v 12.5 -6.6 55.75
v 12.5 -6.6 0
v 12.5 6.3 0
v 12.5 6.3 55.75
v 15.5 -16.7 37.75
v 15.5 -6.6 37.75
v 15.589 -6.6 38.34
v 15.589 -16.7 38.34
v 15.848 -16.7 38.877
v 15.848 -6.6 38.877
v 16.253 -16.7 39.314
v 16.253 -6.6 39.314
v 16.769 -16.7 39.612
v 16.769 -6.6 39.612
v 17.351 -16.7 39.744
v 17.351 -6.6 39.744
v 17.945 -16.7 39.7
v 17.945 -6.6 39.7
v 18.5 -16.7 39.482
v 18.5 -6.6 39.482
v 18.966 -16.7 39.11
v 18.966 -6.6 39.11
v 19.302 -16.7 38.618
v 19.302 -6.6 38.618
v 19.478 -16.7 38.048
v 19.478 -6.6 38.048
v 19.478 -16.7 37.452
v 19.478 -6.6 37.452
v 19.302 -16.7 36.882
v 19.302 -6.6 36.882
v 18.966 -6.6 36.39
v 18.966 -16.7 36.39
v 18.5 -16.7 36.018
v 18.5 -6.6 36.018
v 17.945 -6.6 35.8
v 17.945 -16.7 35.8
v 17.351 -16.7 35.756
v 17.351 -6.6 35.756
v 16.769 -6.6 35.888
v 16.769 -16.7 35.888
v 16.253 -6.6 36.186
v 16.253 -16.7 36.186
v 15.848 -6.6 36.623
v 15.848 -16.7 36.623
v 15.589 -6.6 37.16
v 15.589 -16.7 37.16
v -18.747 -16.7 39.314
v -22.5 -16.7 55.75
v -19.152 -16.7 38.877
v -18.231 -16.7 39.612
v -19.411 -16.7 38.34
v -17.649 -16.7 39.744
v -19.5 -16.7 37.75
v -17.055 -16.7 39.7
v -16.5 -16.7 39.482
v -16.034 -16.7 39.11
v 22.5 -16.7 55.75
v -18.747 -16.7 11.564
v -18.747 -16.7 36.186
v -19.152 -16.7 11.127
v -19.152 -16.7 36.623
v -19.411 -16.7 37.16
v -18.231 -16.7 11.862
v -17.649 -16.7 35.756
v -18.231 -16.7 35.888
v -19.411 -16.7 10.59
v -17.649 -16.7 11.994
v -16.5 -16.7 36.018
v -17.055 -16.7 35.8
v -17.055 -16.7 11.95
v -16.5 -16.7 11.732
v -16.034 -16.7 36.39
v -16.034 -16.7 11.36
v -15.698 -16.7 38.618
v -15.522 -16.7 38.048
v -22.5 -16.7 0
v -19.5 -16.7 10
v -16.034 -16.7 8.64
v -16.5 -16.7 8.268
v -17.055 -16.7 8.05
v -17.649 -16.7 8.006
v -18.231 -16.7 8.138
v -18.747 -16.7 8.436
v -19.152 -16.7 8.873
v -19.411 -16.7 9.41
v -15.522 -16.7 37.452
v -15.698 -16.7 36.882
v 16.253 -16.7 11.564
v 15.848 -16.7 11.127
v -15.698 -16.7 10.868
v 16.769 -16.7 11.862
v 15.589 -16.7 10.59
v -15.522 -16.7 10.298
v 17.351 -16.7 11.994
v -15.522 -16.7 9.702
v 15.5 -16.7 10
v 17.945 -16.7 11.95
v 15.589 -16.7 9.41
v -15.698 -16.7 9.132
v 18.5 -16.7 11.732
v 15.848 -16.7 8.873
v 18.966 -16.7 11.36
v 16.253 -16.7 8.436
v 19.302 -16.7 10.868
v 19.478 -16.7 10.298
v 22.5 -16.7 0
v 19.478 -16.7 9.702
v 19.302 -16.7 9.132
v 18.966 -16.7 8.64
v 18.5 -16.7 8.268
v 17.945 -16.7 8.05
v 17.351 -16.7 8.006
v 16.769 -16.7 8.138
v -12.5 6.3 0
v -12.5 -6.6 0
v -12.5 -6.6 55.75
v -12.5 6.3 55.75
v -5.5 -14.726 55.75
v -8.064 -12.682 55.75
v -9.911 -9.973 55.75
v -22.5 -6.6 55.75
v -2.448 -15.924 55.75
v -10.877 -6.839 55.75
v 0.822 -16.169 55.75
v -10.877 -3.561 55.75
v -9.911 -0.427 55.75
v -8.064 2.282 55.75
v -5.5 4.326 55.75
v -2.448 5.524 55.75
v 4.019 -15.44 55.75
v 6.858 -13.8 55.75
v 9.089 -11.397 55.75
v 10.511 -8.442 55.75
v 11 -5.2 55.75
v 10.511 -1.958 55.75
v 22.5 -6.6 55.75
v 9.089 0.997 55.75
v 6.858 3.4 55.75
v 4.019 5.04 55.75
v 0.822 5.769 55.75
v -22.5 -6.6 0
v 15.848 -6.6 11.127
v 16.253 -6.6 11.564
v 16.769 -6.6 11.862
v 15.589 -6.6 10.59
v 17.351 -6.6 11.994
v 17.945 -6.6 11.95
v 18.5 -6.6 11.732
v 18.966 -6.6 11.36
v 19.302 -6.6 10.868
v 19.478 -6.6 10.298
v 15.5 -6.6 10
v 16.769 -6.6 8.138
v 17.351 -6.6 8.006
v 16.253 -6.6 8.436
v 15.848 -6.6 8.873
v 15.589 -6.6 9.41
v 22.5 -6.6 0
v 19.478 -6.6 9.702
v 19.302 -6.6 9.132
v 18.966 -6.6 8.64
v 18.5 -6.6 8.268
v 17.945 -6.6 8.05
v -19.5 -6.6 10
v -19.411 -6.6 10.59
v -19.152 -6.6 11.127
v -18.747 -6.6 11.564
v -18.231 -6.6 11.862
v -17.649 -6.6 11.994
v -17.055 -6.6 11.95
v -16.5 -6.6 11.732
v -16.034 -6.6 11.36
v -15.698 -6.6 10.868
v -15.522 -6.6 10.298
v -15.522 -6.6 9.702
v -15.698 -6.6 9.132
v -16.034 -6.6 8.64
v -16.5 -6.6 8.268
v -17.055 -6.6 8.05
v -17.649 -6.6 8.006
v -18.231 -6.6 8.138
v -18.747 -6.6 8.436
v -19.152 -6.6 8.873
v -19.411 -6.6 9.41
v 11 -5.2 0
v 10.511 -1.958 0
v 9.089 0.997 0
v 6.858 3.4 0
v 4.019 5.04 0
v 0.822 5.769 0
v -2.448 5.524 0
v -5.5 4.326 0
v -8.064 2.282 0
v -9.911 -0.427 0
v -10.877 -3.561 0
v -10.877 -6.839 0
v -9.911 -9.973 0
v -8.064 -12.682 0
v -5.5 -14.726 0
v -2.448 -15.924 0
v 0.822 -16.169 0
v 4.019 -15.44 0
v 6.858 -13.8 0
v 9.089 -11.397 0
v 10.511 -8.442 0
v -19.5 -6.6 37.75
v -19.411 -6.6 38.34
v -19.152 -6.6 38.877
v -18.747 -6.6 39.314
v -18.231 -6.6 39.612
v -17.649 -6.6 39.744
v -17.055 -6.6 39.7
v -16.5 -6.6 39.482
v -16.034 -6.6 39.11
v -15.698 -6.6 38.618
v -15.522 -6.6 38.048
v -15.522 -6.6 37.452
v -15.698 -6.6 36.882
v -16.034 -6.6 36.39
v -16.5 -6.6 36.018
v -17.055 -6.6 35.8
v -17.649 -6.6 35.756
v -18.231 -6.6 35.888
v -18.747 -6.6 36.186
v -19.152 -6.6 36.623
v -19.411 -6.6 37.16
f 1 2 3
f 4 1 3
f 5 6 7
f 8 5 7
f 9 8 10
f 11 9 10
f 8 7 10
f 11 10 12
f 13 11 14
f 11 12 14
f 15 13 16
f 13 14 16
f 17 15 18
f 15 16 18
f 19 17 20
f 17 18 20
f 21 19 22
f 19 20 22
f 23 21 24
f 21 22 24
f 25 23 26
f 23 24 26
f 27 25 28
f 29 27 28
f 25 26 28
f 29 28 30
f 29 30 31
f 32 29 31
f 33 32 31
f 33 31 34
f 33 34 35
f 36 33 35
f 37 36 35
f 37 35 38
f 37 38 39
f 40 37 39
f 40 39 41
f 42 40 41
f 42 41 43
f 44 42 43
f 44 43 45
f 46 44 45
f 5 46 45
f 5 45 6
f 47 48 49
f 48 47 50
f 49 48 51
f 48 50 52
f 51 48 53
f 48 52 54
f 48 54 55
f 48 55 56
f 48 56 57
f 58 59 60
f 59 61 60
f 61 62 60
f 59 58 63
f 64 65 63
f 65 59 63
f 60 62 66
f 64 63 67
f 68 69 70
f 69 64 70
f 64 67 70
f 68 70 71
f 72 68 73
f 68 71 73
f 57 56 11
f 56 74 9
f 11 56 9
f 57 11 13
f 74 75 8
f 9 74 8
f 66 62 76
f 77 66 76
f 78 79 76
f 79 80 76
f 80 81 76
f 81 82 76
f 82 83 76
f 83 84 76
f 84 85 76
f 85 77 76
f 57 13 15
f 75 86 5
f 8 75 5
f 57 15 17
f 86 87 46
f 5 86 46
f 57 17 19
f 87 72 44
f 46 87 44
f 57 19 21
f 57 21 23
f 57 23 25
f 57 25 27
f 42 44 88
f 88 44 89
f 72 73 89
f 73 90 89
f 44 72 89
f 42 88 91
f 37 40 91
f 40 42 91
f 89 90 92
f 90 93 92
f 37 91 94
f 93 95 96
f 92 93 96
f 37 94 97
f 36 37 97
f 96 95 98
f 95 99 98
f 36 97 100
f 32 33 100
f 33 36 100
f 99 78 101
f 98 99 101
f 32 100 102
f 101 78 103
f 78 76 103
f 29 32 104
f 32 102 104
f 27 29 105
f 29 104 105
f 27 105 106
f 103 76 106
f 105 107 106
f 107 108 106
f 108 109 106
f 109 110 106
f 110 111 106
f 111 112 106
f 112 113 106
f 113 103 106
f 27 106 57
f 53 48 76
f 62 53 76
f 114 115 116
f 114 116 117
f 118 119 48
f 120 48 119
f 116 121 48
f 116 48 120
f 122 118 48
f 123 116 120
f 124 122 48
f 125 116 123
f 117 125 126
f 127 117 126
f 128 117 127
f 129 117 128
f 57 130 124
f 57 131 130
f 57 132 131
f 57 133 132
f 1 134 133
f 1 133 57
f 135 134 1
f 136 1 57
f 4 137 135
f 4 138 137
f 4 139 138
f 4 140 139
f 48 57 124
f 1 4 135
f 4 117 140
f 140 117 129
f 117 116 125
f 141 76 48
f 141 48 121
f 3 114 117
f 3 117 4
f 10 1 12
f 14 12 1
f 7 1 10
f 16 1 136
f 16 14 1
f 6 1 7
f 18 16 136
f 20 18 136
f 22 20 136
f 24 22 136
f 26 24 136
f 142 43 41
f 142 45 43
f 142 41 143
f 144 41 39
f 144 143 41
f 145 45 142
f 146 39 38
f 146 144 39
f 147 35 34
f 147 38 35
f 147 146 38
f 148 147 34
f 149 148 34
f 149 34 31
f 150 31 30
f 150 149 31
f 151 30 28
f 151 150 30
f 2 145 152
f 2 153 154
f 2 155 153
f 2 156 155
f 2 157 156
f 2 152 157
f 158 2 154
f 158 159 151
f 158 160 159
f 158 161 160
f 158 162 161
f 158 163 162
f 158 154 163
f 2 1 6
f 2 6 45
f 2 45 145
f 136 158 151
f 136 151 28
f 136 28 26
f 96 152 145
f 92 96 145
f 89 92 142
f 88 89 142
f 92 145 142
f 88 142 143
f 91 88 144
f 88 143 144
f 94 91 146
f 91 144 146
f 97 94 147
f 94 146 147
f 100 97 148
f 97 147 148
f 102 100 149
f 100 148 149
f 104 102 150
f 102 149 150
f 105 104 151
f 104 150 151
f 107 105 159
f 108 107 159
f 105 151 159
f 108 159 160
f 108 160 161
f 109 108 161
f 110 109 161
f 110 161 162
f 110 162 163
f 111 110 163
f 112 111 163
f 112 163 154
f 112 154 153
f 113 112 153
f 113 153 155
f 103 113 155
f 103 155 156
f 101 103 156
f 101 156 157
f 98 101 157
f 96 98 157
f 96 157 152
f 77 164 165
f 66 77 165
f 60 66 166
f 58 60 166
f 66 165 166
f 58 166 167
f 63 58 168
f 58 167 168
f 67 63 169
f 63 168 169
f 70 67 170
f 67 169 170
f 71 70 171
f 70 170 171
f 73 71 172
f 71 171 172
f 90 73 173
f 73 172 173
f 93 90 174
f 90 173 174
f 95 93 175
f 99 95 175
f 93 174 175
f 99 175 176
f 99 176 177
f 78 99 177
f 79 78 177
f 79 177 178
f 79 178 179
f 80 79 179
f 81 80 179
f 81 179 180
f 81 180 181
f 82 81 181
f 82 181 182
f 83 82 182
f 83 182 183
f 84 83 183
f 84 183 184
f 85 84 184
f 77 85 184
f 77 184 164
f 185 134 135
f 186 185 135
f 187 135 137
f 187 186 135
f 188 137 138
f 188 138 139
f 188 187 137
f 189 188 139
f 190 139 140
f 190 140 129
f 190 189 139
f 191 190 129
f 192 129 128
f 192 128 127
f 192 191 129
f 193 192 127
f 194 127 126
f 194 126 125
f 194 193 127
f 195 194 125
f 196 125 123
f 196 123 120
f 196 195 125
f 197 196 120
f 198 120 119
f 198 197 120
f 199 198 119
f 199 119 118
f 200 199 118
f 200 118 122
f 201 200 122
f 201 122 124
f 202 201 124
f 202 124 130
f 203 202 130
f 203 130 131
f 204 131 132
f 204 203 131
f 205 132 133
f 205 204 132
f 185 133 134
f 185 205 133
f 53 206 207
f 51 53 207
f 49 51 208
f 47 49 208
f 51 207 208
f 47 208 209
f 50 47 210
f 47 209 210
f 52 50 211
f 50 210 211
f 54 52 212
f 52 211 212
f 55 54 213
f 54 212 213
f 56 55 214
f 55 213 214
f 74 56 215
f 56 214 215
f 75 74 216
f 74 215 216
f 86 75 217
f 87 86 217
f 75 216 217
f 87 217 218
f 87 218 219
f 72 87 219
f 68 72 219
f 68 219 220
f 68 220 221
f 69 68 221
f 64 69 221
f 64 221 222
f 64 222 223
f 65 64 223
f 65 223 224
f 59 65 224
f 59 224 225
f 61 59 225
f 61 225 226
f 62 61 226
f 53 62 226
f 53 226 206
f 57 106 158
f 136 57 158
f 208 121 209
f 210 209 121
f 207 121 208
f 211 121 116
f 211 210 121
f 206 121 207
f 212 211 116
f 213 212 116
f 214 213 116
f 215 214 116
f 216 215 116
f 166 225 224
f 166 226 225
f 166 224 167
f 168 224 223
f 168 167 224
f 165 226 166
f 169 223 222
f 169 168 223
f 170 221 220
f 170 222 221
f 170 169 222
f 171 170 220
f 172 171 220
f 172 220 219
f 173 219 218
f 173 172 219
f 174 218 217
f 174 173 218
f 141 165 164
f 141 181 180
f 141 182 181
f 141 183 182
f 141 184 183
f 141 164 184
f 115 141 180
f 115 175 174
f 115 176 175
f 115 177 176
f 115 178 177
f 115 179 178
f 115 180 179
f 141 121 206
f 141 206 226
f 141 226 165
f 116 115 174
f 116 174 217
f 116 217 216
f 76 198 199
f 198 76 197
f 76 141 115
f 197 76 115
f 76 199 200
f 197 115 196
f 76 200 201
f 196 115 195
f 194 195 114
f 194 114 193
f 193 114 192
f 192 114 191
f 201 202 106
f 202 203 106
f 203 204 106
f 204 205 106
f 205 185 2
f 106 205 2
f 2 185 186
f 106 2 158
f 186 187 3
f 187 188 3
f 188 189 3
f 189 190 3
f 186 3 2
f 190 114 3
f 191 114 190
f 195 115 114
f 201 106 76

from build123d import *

# Parameters (mm, degrees)
SKETCH1_W           = 25
SKETCH1_H           = 23
SKETCH1_R           = 11
SKETCH1_W_2         = 10
SKETCH1_H_2         = 10.1
BOSS_EXTRUDE1_DEPTH = 55.75
SKETCH2_R           = 2
CUT_EXTRUDE1_DEPTH  = 62.487580047


with BuildPart() as part:
    # Sketch1 → Boss-Extrude1 (new body)
    # profile 1 of 3: a face of its own
    with BuildSketch(Plane.XY):
        with Locations((0, -5.2)):
            Rectangle(SKETCH1_W, SKETCH1_H)
        with Locations((0, -5.2)):
            Circle(SKETCH1_R, mode=Mode.SUBTRACT)
    # profile 2 of 3: a face of its own
    with BuildSketch(Plane.XY):
        with Locations((-17.5, -11.65)):
            Rectangle(SKETCH1_W_2, SKETCH1_H_2)
    # profile 3 of 3: a face of its own
    with BuildSketch(Plane.XY):
        with Locations((17.5, -11.65)):
            Rectangle(SKETCH1_W_2, SKETCH1_H_2)
    extrude(amount=BOSS_EXTRUDE1_DEPTH)

    # Sketch2 → Cut-Extrude1 (cut, through all)
    with BuildSketch(Plane(origin=(0, -6.6, 0), x_dir=(1, 0, 0), z_dir=(0, 1, 0))):
        with Locations(Location((-17.5, -10, 0), (0, 0, 180))):
            Circle(SKETCH2_R)
        with Locations(Location((17.5, -10, 0), (0, 0, 180))):
            Circle(SKETCH2_R)
        with Locations(Location((-17.5, -37.75, 0), (0, 0, 180))):
            Circle(SKETCH2_R)
        with Locations(Location((17.5, -37.75, 0), (0, 0, 180))):
            Circle(SKETCH2_R)
    extrude(amount=-CUT_EXTRUDE1_DEPTH, mode=Mode.SUBTRACT)


solid = part.part
